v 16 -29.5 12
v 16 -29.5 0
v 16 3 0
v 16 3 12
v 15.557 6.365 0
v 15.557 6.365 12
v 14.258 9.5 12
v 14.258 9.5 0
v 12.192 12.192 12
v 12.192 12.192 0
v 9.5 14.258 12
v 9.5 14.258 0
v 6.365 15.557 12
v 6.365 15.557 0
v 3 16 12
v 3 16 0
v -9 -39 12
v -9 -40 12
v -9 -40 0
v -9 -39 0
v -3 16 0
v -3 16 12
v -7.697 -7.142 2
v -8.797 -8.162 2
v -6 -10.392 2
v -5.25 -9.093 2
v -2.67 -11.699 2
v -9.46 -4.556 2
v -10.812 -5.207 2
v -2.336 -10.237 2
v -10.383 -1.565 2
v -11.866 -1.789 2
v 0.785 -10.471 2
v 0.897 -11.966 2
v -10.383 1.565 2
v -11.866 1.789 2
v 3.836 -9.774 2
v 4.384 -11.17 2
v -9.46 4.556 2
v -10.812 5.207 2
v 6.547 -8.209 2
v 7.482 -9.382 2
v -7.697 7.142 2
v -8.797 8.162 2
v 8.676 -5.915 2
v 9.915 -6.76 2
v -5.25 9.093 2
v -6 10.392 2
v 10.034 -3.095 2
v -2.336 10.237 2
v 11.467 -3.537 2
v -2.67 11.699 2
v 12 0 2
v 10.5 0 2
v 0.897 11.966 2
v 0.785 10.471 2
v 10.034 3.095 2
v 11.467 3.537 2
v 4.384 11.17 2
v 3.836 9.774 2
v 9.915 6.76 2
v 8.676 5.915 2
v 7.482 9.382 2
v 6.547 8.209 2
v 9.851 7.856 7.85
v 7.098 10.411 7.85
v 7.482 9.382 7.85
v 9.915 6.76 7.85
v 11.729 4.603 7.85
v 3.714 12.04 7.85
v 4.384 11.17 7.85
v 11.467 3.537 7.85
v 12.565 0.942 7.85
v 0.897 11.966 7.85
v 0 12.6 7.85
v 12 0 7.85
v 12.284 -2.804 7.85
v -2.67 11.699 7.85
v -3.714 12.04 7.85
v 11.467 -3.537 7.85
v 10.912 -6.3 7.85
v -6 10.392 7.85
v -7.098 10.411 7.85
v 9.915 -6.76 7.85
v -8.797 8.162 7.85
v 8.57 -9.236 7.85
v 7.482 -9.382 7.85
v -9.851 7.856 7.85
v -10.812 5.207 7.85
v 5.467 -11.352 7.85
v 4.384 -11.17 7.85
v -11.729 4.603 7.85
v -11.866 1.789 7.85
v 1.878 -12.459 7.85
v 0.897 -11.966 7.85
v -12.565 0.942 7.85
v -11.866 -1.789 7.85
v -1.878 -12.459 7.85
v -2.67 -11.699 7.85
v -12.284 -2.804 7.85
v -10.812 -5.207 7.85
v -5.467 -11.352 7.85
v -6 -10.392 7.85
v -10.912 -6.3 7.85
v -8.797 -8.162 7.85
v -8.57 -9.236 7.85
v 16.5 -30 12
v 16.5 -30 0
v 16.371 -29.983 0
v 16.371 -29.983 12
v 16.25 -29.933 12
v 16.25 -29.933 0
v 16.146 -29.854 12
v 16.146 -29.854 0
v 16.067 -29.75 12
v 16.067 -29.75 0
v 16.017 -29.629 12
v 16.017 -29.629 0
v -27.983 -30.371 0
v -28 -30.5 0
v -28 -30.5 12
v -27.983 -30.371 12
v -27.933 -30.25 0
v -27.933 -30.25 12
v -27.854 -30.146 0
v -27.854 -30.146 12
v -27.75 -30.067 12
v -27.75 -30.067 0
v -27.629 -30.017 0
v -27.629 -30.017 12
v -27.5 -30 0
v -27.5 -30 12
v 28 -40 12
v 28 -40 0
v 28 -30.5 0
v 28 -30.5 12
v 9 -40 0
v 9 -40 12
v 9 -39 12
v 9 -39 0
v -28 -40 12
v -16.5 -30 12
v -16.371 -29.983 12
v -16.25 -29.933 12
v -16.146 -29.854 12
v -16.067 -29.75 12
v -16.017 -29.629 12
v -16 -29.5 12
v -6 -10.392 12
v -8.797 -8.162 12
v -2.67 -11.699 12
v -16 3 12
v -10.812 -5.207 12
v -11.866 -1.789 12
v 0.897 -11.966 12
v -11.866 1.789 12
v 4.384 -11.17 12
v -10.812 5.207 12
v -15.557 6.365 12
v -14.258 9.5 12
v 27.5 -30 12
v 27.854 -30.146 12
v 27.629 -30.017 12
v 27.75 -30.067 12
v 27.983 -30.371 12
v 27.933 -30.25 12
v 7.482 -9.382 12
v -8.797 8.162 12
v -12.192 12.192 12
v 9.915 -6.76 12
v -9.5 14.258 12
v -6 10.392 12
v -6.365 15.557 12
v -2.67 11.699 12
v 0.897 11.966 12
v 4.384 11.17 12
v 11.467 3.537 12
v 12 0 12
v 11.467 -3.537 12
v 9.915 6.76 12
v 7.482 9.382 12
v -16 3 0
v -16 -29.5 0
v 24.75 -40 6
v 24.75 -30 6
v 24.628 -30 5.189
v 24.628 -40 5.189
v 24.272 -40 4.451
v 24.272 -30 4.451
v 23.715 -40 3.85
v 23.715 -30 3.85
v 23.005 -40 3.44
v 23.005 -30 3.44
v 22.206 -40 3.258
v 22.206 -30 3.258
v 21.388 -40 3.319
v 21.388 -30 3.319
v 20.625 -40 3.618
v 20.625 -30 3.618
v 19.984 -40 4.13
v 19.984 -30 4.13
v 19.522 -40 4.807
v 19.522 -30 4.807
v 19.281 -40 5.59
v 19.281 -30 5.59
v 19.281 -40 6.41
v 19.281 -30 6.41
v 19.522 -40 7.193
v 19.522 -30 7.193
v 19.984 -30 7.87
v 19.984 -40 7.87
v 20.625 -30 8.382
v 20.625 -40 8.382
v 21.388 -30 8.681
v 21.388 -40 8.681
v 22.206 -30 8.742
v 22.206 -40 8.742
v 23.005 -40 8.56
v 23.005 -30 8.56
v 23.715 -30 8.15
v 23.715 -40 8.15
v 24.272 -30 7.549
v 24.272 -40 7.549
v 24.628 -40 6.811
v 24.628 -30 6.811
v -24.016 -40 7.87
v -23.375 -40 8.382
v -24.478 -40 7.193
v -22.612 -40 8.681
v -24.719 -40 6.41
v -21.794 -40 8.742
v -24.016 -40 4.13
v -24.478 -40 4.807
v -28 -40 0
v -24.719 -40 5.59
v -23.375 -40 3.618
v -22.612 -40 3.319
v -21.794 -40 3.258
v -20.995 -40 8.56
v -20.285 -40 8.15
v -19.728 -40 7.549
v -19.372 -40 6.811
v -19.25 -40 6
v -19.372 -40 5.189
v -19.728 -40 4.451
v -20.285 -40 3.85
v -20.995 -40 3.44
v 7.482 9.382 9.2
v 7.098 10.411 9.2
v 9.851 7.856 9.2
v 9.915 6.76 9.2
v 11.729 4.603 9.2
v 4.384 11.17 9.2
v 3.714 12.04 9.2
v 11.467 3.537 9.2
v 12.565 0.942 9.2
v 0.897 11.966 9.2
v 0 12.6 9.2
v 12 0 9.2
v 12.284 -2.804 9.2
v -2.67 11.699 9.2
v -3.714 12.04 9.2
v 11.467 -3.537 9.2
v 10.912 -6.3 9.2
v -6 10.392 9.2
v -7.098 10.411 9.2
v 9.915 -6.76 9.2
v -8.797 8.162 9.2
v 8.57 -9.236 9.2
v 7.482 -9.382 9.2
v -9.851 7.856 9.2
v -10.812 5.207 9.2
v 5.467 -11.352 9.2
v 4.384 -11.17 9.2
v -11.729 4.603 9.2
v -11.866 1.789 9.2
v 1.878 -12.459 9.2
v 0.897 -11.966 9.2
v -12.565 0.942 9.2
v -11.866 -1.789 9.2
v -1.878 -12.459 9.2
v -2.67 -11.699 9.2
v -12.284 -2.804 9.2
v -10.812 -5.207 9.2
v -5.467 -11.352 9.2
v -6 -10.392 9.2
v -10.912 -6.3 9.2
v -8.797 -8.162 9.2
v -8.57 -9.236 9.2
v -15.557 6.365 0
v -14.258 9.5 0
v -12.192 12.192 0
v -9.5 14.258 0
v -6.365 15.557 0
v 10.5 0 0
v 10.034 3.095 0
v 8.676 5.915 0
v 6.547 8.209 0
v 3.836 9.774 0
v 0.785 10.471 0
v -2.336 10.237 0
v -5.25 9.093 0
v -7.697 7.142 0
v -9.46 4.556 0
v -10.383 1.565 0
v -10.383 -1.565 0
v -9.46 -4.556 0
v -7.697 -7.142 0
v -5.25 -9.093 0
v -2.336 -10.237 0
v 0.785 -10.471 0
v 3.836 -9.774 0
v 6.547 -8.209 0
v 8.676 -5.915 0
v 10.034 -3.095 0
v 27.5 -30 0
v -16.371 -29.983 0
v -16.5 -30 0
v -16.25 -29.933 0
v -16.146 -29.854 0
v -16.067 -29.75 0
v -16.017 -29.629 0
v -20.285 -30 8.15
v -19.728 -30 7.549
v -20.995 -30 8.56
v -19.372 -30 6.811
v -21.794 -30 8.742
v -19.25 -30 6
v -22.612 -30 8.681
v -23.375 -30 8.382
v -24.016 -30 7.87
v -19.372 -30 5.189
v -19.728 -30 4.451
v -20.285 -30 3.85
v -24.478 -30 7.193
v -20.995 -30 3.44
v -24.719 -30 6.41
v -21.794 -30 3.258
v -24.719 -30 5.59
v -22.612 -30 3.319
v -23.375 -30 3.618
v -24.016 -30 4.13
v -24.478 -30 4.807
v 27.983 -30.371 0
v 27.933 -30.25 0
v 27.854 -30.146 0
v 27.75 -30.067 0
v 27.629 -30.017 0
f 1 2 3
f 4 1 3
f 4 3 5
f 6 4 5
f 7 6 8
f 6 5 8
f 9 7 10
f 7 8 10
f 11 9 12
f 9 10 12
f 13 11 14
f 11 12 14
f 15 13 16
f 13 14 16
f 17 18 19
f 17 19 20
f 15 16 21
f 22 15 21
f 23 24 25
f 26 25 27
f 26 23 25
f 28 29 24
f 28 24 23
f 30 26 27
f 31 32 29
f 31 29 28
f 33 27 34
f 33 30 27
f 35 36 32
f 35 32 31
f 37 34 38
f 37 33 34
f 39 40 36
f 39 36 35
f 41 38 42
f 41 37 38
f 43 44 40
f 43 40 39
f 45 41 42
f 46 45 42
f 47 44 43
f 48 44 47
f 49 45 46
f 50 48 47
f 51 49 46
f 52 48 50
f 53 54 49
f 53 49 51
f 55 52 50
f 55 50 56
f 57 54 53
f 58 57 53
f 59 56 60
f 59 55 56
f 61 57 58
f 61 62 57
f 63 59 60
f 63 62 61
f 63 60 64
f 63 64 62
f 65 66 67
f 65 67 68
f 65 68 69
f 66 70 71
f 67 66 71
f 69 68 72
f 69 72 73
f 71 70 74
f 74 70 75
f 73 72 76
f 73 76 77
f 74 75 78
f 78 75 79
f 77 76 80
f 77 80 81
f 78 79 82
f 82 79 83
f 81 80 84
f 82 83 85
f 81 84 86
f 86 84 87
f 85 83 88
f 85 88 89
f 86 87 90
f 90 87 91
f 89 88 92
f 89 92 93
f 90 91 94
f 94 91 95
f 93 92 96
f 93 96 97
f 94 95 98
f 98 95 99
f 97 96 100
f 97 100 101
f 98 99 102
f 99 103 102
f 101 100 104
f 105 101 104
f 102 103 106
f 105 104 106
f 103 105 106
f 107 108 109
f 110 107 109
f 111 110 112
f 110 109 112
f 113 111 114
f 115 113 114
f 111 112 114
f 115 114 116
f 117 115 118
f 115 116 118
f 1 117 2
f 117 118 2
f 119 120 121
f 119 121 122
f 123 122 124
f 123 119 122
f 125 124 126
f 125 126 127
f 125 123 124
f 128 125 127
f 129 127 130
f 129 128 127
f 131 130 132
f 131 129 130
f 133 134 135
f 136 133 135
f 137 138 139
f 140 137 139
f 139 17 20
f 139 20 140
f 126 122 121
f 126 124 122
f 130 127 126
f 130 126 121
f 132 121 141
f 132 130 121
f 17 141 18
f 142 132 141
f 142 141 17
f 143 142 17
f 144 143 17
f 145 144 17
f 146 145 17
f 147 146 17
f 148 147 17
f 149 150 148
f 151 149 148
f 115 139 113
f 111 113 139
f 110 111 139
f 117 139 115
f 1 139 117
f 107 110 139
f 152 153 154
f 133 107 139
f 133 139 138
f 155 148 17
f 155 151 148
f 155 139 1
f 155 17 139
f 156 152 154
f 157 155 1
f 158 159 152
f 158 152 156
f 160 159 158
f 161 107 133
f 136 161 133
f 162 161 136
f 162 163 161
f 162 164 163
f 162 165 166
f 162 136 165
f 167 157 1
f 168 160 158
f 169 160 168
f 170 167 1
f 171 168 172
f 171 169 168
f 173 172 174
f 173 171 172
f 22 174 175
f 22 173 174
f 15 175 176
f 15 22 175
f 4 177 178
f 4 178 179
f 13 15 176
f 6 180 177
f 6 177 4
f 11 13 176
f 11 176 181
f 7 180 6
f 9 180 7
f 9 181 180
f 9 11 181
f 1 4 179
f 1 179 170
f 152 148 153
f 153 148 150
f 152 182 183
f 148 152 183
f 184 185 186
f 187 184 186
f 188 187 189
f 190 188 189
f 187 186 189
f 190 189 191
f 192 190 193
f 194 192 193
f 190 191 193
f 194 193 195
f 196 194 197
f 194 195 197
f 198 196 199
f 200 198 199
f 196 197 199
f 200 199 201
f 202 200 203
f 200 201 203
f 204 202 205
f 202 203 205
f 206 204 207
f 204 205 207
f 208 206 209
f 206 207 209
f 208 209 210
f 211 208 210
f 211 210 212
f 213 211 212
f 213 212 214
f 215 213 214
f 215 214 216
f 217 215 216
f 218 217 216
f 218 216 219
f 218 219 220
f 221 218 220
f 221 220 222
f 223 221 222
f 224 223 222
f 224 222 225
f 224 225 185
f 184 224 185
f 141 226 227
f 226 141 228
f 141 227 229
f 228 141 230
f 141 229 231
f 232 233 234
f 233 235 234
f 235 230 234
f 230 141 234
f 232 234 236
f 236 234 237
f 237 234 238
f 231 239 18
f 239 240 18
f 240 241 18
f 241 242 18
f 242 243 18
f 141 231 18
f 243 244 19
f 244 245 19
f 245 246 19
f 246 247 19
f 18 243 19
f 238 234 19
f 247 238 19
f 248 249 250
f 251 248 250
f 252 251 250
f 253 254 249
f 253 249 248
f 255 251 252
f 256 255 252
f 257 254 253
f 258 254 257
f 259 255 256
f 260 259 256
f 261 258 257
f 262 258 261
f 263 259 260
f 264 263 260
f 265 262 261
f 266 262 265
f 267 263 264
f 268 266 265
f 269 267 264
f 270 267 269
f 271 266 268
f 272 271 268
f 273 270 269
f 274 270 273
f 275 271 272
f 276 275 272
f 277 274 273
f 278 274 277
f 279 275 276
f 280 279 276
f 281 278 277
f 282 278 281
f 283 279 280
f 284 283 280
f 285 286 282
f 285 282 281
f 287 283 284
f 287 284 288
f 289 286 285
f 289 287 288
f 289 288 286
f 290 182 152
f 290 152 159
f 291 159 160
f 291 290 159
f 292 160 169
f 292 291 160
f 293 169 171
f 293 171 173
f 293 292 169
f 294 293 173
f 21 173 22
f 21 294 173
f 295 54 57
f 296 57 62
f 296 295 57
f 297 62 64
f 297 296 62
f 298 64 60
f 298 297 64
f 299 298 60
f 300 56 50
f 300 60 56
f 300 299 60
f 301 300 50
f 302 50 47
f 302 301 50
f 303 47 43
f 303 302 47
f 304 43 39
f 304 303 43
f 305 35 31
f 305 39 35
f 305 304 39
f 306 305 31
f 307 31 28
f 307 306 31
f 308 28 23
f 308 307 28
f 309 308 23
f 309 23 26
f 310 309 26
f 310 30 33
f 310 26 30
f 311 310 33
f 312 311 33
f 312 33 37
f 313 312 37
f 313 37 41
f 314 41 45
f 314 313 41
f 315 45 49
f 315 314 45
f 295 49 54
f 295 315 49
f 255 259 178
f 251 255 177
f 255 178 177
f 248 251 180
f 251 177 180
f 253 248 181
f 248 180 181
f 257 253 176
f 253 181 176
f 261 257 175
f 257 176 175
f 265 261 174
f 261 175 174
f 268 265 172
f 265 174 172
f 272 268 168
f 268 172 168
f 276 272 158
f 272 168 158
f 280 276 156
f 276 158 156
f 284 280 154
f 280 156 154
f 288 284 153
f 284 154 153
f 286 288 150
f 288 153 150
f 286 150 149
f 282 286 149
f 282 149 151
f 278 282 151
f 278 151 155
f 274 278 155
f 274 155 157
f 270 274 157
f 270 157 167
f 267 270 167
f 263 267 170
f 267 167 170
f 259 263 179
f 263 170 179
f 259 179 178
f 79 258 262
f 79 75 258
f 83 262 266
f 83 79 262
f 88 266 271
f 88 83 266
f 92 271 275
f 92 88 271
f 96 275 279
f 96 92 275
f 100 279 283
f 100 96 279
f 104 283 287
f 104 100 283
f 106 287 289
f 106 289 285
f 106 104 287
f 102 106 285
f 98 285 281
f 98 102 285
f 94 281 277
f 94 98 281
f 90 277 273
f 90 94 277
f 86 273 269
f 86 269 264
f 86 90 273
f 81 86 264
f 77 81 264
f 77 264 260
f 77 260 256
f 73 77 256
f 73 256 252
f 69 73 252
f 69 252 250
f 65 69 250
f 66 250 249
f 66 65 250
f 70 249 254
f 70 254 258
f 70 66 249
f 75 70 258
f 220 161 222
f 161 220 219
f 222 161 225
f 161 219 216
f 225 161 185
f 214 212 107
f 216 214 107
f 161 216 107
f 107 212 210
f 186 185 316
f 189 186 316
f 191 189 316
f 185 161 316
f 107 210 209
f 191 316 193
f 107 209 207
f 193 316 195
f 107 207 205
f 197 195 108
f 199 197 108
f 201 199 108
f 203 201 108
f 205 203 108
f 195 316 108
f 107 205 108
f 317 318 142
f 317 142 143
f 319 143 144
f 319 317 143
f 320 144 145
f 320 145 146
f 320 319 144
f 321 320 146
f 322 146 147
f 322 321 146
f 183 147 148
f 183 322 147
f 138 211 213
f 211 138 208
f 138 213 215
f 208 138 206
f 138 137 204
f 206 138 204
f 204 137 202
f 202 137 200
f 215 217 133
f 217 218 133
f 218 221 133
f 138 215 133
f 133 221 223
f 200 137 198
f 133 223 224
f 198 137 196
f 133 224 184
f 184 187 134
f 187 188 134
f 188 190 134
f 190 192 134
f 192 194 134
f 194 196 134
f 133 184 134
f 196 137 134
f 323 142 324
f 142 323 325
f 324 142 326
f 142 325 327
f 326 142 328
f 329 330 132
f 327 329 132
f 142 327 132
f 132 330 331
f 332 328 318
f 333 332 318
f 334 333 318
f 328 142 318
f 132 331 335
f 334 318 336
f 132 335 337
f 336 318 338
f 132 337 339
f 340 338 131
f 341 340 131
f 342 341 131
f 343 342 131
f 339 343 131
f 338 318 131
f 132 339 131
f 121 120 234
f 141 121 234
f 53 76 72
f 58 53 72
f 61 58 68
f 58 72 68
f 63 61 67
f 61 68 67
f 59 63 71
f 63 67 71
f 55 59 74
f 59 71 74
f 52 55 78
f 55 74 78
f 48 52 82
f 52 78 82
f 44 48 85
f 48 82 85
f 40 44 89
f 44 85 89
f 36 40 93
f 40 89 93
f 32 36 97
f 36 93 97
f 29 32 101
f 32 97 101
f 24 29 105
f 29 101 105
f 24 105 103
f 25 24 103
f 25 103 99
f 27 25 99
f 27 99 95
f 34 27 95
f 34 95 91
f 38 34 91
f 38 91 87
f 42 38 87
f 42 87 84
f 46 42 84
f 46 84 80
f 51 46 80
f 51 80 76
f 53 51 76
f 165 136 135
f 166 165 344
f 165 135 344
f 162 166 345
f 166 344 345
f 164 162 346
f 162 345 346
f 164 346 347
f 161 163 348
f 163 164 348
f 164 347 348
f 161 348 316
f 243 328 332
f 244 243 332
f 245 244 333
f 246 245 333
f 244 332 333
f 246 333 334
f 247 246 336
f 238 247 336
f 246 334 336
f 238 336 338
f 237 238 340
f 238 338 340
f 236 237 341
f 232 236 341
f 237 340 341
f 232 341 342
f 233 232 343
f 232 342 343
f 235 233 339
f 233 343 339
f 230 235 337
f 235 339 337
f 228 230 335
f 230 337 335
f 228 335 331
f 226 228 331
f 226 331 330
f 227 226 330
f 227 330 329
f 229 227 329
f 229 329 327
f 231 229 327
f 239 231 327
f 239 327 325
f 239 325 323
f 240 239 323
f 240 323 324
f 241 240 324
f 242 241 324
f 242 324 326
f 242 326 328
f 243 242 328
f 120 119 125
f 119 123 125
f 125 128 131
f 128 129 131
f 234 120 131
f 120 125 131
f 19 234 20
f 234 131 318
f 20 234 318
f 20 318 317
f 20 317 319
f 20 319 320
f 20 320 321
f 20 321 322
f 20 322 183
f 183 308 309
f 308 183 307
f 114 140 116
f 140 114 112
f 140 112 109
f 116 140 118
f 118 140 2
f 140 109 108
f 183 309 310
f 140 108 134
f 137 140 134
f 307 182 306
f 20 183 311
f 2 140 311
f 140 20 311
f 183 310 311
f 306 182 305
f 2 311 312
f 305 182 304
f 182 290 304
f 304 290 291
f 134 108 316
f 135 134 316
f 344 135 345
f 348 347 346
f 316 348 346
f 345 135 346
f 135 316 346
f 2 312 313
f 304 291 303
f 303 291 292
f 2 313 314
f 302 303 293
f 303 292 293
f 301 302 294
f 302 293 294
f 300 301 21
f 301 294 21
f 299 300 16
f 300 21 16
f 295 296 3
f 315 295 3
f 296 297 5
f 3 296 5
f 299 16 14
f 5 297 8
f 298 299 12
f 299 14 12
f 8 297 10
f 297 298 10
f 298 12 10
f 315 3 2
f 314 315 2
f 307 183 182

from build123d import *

# Parameters (mm, degrees)
SKETCH1_R           = 10.5
BOSS_EXTRUDE1_DEPTH = 12
CUT_EXTRUDE1_DEPTH  = 13
BOSS_EXTRUDE2_DEPTH = 12
CUT_EXTRUDE2_DEPTH  = 13
SKETCH5_R           = 2.75
CUT_EXTRUDE3_DEPTH  = 11
SKETCH7_R           = 12
CUT_EXTRUDE4_DEPTH  = 10
SKETCH10_W          = 18
SKETCH10_H          = 1
CUT_EXTRUDE5_DEPTH  = 13
SKETCH11_W          = 1.35
SKETCH11_H          = 0.6


with BuildPart() as part:
    # Sketch1 → Boss-Extrude1 (new body)
    with BuildSketch(Plane.XY):
        Polygon((-28, -40), (28, -40), (28, -30), (16, -30), (16, 16), (-16, 16), (-16, -30), (-28, -30), align=None)
        Circle(SKETCH1_R, mode=Mode.SUBTRACT)
    extrude(amount=BOSS_EXTRUDE1_DEPTH)

    # Sketch2 → Cut-Extrude1 (cut, through all)
    with BuildSketch(Plane.XY):
        with BuildLine():
            Line((3, 16), (16, 16))
            Line((16, 16), (16, 3))
            ThreePointArc((16, 3), (12.192388155, 12.192388155), (3, 16))
        make_face()
        with BuildLine():
            Line((-3, 16), (-16, 16))
            Line((-16, 16), (-16, 3))
            ThreePointArc((-16, 3), (-12.192388155, 12.192388155), (-3, 16))
        make_face()
    extrude(amount=CUT_EXTRUDE1_DEPTH, mode=Mode.SUBTRACT)

    # Sketch3 → Boss-Extrude2 (add, through all)
    with BuildSketch(Plane.XY):
        with BuildLine():
            Line((16, -29.5), (16, -30))
            Line((16, -30), (16.5, -30))
            ThreePointArc((16.5, -30), (16.146446609, -29.853553391), (16, -29.5))
        make_face()
        with BuildLine():
            Line((-16, -29.5), (-16, -30))
            Line((-16, -30), (-16.5, -30))
            ThreePointArc((-16.5, -30), (-16.146446609, -29.853553391), (-16, -29.5))
        make_face()
    extrude(amount=BOSS_EXTRUDE2_DEPTH)

    # Sketch4 → Cut-Extrude2 (cut, through all)
    with BuildSketch(Plane.XY):
        with BuildLine():
            Line((-27.5, -30), (-28, -30))
            Line((-28, -30), (-28, -30.5))
            ThreePointArc((-28, -30.5), (-27.853553391, -30.146446609), (-27.5, -30))
        make_face()
        with BuildLine():
            Line((27.5, -30), (28, -30))
            Line((28, -30), (28, -30.5))
            ThreePointArc((28, -30.5), (27.853553391, -30.146446609), (27.5, -30))
        make_face()
    extrude(amount=CUT_EXTRUDE2_DEPTH, mode=Mode.SUBTRACT)

    # Sketch5 → Cut-Extrude3 (cut, through all)
    with BuildSketch(Plane(origin=(0, -30, 0), x_dir=(1, 0, 0), z_dir=(0, 1, 0))):
        with Locations((-22, -6)):
            Circle(SKETCH5_R)
        with Locations((22, -6)):
            Circle(SKETCH5_R)
    extrude(amount=-CUT_EXTRUDE3_DEPTH, mode=Mode.SUBTRACT)

    # Sketch7 → Cut-Extrude4 (cut)
    with BuildSketch(Plane.XY.offset(12)):
        Circle(SKETCH7_R)
    extrude(amount=-CUT_EXTRUDE4_DEPTH, mode=Mode.SUBTRACT)

    # Sketch10 → Cut-Extrude5 (cut, through all)
    with BuildSketch(Plane.XY.offset(12)):
        with Locations((0, -39.5)):
            Rectangle(SKETCH10_W, SKETCH10_H)
    extrude(amount=-CUT_EXTRUDE5_DEPTH, mode=Mode.SUBTRACT)

    # Sketch11 → Cut-Revolve1 (revolve, cut)
    with BuildSketch(Plane(origin=(0, 0, 0), x_dir=(0, 0, -1), z_dir=(1, 0, 0))):
        with Locations((-8.525, 12.3)):
            Rectangle(SKETCH11_W, SKETCH11_H)
    revolve(axis=Axis((0, 0, -88.99), (0, 0, 1)), mode=Mode.SUBTRACT)


solid = part.part
